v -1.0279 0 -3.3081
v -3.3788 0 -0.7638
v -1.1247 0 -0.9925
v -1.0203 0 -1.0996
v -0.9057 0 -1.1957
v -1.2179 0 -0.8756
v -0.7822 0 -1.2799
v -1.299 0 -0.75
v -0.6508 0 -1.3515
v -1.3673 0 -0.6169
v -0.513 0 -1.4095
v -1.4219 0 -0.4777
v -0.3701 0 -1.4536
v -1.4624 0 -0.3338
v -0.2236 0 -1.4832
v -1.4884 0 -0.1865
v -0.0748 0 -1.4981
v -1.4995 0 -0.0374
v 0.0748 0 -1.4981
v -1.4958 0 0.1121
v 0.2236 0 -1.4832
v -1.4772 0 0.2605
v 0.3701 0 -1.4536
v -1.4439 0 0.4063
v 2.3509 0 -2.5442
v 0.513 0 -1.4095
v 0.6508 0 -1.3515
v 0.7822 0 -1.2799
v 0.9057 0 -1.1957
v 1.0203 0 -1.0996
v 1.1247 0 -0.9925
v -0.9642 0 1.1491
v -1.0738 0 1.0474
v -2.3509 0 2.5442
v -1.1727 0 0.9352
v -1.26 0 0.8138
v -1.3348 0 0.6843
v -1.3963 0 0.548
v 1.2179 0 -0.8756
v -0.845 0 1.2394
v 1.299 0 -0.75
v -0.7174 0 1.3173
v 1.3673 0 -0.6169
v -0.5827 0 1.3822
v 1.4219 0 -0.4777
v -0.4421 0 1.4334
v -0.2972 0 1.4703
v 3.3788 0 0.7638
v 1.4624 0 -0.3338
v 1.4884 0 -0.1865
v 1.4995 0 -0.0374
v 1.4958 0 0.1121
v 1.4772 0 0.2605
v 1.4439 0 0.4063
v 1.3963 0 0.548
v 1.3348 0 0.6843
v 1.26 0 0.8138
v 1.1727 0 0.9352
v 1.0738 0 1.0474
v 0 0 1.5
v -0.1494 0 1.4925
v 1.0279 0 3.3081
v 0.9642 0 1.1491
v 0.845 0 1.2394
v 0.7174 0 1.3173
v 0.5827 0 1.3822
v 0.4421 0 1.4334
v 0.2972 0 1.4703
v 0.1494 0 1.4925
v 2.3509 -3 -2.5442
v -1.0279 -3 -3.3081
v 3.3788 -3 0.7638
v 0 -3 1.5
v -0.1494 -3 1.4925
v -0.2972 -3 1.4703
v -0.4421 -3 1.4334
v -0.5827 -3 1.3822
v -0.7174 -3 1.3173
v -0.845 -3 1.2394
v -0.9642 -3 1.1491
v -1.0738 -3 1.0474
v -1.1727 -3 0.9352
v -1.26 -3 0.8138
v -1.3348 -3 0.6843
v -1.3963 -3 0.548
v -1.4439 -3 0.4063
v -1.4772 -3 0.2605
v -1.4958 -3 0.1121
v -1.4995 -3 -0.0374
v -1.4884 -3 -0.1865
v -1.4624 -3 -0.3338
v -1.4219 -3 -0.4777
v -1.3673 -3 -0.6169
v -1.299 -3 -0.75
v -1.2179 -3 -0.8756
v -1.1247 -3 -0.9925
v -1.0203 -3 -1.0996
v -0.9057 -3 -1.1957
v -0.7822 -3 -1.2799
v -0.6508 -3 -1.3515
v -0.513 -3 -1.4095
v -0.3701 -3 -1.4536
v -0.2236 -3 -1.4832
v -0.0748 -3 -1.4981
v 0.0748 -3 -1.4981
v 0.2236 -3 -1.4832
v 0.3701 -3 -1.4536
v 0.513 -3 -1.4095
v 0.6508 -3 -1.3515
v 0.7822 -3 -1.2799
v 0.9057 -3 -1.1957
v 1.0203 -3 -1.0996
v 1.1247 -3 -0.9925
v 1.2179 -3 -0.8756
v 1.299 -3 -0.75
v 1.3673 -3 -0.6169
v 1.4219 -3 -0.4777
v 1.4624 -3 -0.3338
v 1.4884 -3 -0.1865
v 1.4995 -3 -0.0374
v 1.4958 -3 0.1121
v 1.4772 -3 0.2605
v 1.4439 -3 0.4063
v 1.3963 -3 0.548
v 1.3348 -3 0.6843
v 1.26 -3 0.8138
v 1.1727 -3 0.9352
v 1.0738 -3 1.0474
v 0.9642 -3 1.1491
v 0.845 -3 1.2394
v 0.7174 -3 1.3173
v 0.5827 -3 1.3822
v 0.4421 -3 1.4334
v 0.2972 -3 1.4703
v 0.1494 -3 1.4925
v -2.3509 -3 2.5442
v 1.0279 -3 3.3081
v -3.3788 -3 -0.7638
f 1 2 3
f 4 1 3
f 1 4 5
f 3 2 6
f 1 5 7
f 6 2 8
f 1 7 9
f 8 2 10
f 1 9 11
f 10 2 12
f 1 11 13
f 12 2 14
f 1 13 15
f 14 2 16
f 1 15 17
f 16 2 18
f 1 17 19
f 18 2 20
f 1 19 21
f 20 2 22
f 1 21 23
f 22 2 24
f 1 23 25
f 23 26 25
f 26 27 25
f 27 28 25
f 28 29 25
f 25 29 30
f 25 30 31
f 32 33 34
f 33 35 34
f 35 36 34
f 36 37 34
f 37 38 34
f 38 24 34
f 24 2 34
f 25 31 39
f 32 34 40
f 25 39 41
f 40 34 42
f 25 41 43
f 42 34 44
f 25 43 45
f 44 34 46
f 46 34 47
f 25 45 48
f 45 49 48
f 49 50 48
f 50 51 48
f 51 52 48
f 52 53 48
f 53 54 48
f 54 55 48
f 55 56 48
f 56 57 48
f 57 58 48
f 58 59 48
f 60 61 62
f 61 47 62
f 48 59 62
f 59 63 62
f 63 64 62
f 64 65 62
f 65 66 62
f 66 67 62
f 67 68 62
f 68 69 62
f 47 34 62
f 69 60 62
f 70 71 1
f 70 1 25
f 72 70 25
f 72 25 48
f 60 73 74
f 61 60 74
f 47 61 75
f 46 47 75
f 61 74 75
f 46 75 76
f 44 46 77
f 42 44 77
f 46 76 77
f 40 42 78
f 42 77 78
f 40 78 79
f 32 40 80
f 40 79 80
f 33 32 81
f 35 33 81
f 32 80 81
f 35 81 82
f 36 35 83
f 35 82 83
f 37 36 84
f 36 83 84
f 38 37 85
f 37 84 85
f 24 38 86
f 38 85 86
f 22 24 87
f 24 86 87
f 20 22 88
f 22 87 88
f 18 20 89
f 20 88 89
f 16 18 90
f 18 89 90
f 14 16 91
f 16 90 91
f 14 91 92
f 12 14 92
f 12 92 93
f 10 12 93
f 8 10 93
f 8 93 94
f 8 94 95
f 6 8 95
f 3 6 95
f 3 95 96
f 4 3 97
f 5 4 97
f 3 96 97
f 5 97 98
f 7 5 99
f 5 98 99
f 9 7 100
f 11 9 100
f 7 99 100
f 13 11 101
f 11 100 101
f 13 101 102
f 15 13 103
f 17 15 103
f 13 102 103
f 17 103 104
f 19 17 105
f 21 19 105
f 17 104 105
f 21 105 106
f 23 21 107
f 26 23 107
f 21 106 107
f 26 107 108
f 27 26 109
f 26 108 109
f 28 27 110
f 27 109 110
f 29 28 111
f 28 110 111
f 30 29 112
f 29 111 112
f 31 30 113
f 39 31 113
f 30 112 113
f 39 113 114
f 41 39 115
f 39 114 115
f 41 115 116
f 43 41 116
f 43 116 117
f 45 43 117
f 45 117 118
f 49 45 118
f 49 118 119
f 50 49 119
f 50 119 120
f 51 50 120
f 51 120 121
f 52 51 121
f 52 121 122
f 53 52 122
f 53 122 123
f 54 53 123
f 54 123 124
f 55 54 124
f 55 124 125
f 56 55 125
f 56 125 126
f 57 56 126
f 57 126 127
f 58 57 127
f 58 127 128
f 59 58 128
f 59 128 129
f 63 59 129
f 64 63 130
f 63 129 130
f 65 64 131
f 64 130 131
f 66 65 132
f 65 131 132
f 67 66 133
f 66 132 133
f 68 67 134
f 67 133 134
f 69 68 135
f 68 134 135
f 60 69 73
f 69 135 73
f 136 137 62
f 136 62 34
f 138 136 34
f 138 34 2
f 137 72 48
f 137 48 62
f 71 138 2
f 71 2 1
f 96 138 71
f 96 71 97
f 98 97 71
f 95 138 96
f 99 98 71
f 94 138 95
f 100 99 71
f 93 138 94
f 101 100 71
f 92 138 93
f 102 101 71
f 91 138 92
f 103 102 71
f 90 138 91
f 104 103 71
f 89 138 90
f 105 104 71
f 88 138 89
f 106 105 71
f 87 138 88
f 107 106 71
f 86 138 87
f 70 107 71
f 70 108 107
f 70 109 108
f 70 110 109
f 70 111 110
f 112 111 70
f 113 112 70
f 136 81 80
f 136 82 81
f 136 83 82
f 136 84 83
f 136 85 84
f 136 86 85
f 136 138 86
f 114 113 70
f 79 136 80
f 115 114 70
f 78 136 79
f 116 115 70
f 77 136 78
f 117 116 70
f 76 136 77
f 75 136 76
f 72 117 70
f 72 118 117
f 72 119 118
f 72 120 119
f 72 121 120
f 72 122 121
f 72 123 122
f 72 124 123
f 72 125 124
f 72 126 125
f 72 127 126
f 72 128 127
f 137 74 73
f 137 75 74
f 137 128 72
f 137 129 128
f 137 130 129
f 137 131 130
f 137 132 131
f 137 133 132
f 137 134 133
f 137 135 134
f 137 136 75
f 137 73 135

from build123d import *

# Parameters (mm, degrees)
ESQUISSE1_R        = 1.5
BOSS_EXTRU_1_DEPTH = 3


with BuildPart() as part:
    # Esquisse1 → Boss.-Extru.1 (new body)
    with BuildSketch(Plane.XZ.offset(3)):
        Polygon((2.350913118, -2.544249892), (3.378841599, 0.763825536), (1.027928481, 3.308075428), (-2.350913118, 2.544249892), (-3.378841599, -0.763825536), (-1.027928481, -3.308075428), align=None)
        with Locations(Location((0, 0, 0), (0, 0, 90))):
            Circle(ESQUISSE1_R, mode=Mode.SUBTRACT)
    extrude(amount=-BOSS_EXTRU_1_DEPTH)


solid = part.part
